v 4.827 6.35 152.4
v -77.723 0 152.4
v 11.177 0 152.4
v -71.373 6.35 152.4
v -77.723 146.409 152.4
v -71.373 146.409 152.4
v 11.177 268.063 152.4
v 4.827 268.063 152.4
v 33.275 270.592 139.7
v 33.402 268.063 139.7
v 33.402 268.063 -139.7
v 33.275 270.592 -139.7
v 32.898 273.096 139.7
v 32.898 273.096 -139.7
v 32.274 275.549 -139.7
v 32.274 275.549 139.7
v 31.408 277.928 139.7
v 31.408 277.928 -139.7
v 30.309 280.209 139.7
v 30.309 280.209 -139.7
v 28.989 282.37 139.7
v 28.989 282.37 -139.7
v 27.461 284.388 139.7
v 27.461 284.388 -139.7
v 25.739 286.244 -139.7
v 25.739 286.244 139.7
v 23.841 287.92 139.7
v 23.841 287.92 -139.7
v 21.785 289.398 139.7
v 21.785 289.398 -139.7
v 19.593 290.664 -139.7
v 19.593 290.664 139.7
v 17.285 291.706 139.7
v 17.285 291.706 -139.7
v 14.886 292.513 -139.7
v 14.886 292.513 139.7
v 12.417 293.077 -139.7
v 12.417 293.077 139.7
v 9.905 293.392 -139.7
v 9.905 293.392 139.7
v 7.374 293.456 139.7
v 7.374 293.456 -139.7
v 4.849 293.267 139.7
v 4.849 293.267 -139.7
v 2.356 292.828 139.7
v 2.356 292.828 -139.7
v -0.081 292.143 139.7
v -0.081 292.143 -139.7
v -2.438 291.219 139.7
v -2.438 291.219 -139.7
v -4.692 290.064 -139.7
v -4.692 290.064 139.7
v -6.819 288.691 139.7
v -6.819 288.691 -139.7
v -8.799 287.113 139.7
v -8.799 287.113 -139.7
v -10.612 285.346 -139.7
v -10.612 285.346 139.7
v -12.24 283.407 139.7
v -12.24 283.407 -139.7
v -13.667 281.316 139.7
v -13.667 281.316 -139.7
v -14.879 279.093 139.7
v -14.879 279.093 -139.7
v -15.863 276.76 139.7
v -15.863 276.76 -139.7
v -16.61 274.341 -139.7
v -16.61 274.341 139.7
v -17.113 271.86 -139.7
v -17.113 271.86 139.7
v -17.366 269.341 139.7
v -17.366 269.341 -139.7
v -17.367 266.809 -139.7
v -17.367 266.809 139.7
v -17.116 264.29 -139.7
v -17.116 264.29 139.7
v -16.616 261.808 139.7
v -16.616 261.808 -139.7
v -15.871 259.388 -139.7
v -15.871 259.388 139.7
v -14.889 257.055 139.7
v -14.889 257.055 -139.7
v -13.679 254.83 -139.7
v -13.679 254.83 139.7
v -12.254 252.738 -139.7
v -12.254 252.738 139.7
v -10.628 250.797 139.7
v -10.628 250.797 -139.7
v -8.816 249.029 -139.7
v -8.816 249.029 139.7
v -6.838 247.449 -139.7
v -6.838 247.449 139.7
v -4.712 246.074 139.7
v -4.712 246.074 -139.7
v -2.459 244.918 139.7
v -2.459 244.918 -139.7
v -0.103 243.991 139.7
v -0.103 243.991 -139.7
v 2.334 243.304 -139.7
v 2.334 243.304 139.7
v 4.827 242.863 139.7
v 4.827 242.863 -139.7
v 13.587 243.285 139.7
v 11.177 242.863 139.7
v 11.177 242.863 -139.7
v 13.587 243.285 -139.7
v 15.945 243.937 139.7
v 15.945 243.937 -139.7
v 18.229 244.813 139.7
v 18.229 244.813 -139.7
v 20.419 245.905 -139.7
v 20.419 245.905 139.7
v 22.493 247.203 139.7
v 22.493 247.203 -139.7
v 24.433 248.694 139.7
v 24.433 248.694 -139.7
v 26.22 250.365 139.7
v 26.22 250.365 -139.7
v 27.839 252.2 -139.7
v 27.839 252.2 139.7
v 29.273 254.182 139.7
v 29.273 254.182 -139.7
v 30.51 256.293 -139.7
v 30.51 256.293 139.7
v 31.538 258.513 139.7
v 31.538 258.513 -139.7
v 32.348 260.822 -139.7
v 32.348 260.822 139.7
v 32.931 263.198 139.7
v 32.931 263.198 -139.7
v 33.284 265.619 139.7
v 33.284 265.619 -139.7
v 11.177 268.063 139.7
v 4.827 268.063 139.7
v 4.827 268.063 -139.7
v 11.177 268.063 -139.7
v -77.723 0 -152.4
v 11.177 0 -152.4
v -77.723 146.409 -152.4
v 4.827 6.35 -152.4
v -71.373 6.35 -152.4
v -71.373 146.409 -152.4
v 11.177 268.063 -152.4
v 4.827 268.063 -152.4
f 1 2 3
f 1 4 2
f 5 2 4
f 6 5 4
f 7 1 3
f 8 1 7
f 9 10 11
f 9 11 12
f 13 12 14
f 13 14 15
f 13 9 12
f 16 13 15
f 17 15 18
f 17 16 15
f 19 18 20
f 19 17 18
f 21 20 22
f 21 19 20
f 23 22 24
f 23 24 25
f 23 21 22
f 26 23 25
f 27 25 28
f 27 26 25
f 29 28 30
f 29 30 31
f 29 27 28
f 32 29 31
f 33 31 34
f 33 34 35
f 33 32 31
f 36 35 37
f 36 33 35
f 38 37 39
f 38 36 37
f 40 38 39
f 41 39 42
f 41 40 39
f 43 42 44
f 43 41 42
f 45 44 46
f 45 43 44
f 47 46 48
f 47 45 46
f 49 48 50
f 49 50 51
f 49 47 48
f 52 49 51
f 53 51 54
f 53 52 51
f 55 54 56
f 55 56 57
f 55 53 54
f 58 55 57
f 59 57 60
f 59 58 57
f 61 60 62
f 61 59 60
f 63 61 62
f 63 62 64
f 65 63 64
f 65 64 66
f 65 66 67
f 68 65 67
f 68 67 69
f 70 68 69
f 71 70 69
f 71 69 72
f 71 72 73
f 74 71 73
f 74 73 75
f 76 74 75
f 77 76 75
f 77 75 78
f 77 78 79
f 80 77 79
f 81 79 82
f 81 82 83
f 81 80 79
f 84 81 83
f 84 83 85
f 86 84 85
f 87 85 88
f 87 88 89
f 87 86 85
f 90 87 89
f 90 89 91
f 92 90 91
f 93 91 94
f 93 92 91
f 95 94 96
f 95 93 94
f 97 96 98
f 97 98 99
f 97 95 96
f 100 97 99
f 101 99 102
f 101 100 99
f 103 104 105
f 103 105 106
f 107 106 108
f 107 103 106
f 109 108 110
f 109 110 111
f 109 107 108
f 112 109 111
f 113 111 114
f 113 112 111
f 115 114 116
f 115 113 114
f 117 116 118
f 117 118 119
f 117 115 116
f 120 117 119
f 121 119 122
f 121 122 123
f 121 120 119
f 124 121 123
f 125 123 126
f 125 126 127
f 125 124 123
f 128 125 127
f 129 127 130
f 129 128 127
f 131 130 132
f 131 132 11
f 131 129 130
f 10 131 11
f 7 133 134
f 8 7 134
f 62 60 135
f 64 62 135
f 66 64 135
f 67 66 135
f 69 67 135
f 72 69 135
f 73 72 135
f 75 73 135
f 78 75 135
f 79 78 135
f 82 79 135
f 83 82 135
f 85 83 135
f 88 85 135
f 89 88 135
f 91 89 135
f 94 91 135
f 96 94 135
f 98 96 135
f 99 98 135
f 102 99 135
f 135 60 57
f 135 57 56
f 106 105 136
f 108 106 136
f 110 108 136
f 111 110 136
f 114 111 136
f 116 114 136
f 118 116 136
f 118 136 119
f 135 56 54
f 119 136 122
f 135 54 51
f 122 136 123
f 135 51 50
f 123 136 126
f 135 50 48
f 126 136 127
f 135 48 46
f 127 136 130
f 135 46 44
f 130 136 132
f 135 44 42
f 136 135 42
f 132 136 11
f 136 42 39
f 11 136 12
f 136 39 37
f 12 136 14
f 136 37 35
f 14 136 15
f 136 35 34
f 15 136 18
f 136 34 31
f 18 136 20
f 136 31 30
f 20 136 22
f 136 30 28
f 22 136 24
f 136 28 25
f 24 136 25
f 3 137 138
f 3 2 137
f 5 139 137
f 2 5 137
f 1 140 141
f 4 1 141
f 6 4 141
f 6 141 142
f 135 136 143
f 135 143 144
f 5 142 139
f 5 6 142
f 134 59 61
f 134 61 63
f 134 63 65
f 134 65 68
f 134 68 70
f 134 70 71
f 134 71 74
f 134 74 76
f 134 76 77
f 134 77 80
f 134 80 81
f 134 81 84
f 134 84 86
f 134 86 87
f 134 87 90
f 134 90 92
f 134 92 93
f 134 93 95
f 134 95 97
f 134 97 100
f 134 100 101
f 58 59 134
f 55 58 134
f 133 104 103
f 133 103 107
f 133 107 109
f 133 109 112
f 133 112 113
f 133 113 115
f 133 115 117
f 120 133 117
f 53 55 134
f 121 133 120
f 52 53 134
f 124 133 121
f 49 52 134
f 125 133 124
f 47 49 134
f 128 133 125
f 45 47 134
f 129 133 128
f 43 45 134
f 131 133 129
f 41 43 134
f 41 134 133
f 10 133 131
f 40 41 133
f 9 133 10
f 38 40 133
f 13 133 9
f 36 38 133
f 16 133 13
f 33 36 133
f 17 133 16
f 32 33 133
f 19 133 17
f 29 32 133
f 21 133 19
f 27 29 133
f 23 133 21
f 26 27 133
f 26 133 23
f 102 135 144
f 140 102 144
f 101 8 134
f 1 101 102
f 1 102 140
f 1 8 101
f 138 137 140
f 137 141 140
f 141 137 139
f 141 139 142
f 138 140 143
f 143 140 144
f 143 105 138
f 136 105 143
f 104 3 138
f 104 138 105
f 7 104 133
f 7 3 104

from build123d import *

# Parameters (mm, degrees)
F1_DEPTH = 152.4
F2_DEPTH = 139.7


with BuildPart() as f1:
    # F0 (on Top) → F1 (new body, symmetric)
    with BuildSketch(Plane.XY):
        with BuildLine():
            Line((-77.723362, 0), (11.176638, 0))
            Line((11.176638, 0), (11.176638, 242.86254))
            ThreePointArc((11.176638, 242.86254), (8.001638, 242.663321), (4.826638, 242.86254))
            Line((4.826638, 242.86254), (4.826638, 6.35))
            Line((4.826638, 6.35), (-71.373362, 6.35))
            Line((-71.373362, 6.35), (-71.373362, 146.409275))
            Line((-71.373362, 146.409275), (-77.723362, 146.409275))
            Line((-77.723362, 146.409275), (-77.723362, 0))
        make_face()
        with BuildLine():
            ThreePointArc((4.826638, 242.86254), (8.001638, 242.663321), (11.176638, 242.86254))
            Line((11.176638, 242.86254), (11.176638, 268.063321))
            Line((11.176638, 268.063321), (4.826638, 268.063321))
            Line((4.826638, 268.063321), (4.826638, 242.86254))
        make_face()
    extrude(amount=F1_DEPTH, both=True)

    # F0 (on Top) → F2 (join, symmetric)
    with BuildSketch(Plane.XY):
        with BuildLine():
            Line((11.176638, 268.063321), (11.176638, 242.86254))
            ThreePointArc((11.176638, 242.86254), (27.051638, 251.262801), (33.401638, 268.063321))
            ThreePointArc((33.401638, 268.063321), (-8.798883, 287.113321), (4.826638, 242.86254))
            Line((4.826638, 242.86254), (4.826638, 268.063321))
            Line((4.826638, 268.063321), (11.176638, 268.063321))
        make_face()
    extrude(amount=F2_DEPTH, both=True)


solid = f1.part
